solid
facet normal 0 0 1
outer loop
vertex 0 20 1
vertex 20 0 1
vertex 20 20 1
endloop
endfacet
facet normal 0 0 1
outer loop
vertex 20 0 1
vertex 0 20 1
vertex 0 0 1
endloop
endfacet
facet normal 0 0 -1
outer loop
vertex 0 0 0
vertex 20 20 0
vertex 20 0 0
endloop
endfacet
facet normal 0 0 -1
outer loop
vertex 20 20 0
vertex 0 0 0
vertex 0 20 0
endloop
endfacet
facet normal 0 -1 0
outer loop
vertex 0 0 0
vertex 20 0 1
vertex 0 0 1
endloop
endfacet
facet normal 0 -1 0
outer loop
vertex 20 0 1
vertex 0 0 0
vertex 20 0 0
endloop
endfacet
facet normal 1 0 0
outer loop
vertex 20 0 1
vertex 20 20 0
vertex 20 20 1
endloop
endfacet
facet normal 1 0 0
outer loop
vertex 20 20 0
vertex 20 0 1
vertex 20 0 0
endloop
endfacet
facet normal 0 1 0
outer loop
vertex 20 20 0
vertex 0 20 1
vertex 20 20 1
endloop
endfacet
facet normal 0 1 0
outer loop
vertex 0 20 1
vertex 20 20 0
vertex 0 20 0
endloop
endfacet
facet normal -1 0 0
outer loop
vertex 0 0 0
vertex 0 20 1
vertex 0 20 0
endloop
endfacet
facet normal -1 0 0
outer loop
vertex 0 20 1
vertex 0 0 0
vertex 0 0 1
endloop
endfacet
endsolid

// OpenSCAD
// file: ../OpenSCAD/HourOfCode.scad
tileHeight = 5;

module tile(x, y) {

    difference() {
        difference() {
            difference(){
                difference() {
                    translate([x, y, 0])
                        cube([20,20,tileHeight]);

                translate([x , y , tileHeight-3])
                    rotate([45,0,0])
                        cube([20, 4, 4]);
                } 
            translate([x , y + 20, tileHeight-3])
                rotate([45,0,0])
                    cube([20, 4, 4]);
            }

        translate([x , y , tileHeight-3])
            rotate([45,0,90])
               cube([20, 4, 4]);
        }
        translate([x + 20, y + 0, tileHeight-3])
            rotate([45,0,90])
               cube([20, 4, 4]);
    }

}



module cog(x, y) {
    translate([x, y, 0]) {
        cube([20, 20, 1]);
        translate([10, 10, 1]) {
            scale([0.25, 0.25, 0.25]) {
                surface(file = "../OpenSCAD/HourOfCodeCog.png", center = true, convexity = 5);
            }
        }
    }
}

module cross(x, y) {
    translate([x, y, 0]) {
        cube([20, 20, 1]);
            translate([10, 10, 15]) {
            rotate([0, 0, 0]) {
                scale([0.18, 0.18, 0.15]) {
                    surface(file = "../OpenSCAD/HourOfCodeCross.png", invert = true, center = true, convexity = 5);
                }
            }
        }
    }
}

module boxes(x, y) {
    translate([x, y, 0]) {
        cube([20, 20, 1]);
        translate([6, 1, 0])
            rotate([0, 0, 45])
                cube([7, 7, 7]);
        translate([8, 11, 0])
            rotate([0, 0, 10])
                cube([7, 7, 7]);
        translate([14, 3, 0])
            rotate([0, 0, 40])
                cube([7, 7, 7]);
        translate([8, 6, 7])
            rotate([0, 0, 0])
                cube([7, 7, 7]);
    }
}

module boardTest() {
    difference() {
        cube([50, 50, 10]);
        translate([5, 5, 5])
            cube([40, 40, 6]);
    }
    translate([5, 5, 3])
        for (tx =[0:20:30]) 
            for (ty =[0:20:30]) {
                tile(tx,ty);
            }
}

module board() {
    difference() {
        cube([170, 170, 10]);
        translate([5, 5, 5])
            cube([160, 160, 6]);
    }
    translate([5, 5, 3])
        for (tx =[0:20:150]) 
            for (ty =[0:20:150]) {
                tile(tx,ty);
            }
}

module topPiece(x, y) {
    translate([x + 20, y, 8]) {
    rotate([0, 180, 0]) {
        difference() {
            translate([0, 0, 2]) 
                cube([20, 20, 6]);
            tile(0, 0);
        }
    }
}
}

/*
for (tx =[0:22:60]) {
    topPiece(tx, 0);
}
*/



/*
translate([0, 0, 0])
    color("Blue", 0.5)
        cog(0, 0);
//translate([0, 20, 0])
//    rotate([180, 0, 0])
//        topPiece(0, 0);


translate([0, -25, 0])
    color("Red", 0.5)
        cross(0, 0);
//translate([0, -5, 0])
//    rotate([180, 0, 0])
//        topPiece(0, 0);
*/


//tile(0, 0);
//board();
//boardTest();
//topPiece(0,0);
//cog(0, 0);
//cross(0, 0);



  
// main file
include <../OpenSCAD/HourOfCode.scad>;

/*
// ------------------------------------------------------------- //
// ------------------------------------------------------------- //
//                        T O    U S E  ;                        //
// 1. Create a file and add the following line at the top;       //
include <../OpenSCAD/HourOfCode.scad>; // already done in this file
// 2. Use one of the following templates;                        
//tile(x, y);   // build a tile, which a top piece can fit on
//board();      // build an 8 x 8 board of tiles
//boardTest();  // build a 2 x 2 board of tiles
//topPiece(x,0);// build a top piece, which will fit on top of the board
//cog(x, y);    // build a cog, to fit on top of a top piece (scrap metal)
//cross(x, y);  // build a cross, to fit on top of a top piece (bandit)
//boxes(x, y)   // build a pile of boxes, to fit on top of a top piece (obstacle)
// where x and y are the coordinates used to place the model (0, 0 works well)
*/
// ------------------------------------------------------------- //
// ------------------------------------------------------------- //

cog(0, 0);
